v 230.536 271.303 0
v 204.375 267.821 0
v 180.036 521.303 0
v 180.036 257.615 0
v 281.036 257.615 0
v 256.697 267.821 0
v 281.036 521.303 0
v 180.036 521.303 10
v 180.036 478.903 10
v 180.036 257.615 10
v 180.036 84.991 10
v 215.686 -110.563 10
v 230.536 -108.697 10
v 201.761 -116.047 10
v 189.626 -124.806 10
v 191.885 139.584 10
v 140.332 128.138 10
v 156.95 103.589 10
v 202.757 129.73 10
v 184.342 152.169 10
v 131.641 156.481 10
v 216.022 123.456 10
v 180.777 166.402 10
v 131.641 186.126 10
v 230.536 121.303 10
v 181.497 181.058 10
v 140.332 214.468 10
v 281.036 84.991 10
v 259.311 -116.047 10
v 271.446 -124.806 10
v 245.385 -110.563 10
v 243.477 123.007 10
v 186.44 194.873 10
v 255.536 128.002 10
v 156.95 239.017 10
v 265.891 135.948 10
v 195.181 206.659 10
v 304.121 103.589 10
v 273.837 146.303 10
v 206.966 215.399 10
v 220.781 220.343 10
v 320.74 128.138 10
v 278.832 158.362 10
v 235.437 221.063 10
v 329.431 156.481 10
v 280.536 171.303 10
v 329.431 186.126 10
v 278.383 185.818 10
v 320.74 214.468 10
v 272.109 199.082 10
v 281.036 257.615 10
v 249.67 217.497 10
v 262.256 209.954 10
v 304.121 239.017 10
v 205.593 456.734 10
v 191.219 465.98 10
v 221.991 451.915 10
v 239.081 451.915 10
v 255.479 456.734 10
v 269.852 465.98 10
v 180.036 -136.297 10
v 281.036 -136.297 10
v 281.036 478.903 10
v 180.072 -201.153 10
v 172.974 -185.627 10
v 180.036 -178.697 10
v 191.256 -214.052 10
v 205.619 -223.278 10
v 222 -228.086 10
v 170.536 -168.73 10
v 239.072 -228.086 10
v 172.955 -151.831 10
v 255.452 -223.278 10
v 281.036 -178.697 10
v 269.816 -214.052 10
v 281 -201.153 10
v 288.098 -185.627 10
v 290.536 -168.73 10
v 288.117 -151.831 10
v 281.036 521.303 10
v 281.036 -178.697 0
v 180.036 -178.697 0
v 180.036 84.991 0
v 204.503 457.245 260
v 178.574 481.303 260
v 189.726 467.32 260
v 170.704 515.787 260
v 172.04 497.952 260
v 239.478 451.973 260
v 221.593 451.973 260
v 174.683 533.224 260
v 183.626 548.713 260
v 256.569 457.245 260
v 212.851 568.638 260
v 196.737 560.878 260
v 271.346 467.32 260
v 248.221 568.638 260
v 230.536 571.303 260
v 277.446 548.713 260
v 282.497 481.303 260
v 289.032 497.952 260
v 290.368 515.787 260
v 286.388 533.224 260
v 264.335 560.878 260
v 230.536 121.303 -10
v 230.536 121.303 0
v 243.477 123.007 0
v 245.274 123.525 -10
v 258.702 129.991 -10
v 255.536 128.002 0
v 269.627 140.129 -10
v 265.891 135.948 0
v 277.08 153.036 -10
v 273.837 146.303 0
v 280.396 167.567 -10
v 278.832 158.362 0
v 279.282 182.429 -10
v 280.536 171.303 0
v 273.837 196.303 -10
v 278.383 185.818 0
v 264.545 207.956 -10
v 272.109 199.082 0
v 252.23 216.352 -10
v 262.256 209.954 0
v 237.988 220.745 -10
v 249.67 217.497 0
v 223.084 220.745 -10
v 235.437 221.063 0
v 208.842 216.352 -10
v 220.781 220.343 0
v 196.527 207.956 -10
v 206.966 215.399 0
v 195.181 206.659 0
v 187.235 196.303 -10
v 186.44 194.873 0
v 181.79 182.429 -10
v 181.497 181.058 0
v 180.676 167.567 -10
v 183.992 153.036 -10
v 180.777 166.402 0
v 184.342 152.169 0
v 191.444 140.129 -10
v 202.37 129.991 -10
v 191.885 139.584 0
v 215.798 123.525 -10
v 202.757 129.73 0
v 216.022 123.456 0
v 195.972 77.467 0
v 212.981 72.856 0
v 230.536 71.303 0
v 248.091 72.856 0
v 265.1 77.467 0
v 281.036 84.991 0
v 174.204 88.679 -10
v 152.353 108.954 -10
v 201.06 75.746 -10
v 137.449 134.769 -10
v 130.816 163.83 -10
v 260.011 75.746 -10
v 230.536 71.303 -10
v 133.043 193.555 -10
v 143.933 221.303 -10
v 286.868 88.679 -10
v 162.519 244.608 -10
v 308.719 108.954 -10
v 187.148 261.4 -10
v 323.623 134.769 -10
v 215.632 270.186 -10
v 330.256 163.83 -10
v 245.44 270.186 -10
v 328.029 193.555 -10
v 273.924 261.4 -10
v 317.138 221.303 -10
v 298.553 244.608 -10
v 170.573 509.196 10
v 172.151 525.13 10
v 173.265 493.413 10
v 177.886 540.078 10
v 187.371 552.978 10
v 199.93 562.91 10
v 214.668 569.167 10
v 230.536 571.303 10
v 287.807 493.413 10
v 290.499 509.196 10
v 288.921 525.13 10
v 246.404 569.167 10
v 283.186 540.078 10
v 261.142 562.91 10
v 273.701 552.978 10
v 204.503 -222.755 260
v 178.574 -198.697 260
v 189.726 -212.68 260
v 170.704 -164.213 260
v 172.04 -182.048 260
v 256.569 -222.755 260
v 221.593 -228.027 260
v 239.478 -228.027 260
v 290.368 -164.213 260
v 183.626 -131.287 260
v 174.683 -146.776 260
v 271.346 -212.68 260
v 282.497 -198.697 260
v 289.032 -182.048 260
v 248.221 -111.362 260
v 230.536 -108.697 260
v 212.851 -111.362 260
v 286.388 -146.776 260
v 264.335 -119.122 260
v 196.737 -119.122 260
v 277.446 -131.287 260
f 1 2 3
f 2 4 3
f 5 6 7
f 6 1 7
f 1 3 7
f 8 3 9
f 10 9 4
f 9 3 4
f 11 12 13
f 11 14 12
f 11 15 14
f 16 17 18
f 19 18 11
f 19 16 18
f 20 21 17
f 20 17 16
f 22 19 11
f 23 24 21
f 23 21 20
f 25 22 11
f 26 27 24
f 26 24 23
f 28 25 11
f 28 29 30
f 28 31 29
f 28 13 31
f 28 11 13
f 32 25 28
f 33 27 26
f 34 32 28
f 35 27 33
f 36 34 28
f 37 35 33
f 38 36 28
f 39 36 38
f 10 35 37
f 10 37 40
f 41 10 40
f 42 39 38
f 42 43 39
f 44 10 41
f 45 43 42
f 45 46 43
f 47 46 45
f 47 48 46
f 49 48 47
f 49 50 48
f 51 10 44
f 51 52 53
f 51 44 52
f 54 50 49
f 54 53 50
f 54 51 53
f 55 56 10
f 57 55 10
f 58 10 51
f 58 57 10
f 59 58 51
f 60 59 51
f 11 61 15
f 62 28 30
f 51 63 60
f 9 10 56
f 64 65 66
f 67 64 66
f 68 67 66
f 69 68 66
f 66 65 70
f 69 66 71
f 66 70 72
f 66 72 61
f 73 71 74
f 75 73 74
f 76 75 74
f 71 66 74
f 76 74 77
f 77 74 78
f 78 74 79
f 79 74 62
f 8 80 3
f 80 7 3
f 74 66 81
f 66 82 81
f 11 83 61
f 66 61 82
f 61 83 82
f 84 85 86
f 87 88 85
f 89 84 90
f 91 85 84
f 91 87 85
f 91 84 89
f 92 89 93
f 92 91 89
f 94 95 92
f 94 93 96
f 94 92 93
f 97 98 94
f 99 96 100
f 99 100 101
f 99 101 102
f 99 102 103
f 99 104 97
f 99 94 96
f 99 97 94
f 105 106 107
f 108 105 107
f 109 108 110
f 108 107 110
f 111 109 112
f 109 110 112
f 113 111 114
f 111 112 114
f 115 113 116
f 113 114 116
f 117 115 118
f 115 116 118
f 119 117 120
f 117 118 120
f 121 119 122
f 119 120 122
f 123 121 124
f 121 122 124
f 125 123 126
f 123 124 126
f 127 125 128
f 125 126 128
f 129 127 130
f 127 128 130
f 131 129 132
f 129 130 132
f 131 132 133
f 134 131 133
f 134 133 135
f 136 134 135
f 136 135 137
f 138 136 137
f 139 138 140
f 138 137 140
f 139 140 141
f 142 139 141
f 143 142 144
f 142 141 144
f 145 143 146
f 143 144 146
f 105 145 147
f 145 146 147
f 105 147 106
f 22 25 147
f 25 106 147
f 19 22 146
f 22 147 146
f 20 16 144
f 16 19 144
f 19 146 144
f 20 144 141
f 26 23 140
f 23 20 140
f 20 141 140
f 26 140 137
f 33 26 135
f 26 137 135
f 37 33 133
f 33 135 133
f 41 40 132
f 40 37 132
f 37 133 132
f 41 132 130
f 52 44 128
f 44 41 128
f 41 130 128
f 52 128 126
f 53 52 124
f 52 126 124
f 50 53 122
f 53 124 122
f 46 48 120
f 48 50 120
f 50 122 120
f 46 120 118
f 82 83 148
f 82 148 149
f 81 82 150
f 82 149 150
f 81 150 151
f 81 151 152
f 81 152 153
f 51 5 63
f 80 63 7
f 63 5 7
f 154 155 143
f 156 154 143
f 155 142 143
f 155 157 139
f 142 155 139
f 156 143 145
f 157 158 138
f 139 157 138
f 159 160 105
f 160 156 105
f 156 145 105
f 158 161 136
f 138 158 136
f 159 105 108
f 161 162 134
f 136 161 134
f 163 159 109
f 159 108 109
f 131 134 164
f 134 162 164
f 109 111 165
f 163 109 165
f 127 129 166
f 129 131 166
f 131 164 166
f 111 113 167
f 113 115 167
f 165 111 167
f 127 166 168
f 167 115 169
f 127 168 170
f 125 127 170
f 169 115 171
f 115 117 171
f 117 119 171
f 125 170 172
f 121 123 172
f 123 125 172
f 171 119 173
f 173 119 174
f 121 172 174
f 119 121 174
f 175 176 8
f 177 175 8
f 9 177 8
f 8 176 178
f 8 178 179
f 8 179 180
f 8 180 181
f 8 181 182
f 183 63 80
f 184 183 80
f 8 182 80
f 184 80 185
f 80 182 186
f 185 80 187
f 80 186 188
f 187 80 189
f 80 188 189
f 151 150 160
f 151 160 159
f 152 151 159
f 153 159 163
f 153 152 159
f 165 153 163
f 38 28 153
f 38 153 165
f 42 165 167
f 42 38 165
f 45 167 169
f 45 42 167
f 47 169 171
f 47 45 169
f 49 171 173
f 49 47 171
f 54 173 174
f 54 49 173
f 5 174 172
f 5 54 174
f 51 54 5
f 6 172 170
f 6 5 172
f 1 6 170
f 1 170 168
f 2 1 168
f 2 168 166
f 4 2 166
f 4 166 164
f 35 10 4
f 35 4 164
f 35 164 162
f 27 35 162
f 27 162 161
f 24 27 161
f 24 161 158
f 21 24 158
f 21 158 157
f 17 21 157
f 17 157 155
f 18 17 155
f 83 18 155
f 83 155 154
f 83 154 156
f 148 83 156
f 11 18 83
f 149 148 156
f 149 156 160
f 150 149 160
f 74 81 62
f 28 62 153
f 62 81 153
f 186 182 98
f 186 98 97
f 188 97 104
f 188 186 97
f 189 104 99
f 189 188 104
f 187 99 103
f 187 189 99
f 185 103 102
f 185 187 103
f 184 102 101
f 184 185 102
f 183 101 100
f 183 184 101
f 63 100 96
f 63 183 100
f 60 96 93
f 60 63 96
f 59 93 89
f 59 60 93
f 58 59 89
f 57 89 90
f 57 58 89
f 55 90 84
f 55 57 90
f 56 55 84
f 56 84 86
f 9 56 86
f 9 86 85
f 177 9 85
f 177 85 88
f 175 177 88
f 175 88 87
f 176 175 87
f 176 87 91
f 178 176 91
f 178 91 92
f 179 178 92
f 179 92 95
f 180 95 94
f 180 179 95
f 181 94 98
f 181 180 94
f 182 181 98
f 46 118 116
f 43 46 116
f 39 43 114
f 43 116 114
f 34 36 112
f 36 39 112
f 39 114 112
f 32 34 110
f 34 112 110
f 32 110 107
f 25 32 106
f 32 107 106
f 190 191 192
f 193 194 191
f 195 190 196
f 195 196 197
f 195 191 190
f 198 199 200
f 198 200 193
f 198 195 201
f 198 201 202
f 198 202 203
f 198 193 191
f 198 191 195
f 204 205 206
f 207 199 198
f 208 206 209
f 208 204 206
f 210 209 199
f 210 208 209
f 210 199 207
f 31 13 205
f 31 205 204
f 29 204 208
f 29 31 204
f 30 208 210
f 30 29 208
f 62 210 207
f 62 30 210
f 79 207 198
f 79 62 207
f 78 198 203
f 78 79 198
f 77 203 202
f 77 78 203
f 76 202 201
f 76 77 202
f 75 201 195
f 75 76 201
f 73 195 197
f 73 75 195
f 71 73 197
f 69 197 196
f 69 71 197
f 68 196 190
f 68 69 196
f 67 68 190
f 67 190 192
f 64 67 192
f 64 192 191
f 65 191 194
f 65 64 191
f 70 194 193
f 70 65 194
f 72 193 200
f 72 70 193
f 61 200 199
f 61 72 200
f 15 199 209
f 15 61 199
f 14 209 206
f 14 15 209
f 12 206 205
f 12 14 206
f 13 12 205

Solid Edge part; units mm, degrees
sketch "Sketch1" plane through (0, 0, 0) normal (0, 0, 1) x (1, 0, 0)
  circle A0 centre (230.5359, 171.3033) radius 50
  line L0 (180.0359, -178.6967) -> (281.0359, -178.6967)
  line L1 (281.0359, -178.6967) -> (281.0359, 521.3033)
  line L2 (281.0359, 521.3033) -> (180.0359, 521.3033)
  line L3 (180.0359, 521.3033) -> (180.0359, -178.6967)
  dimension "D1" = 700
  dimension "D2" = 101
  dimension "D3" = 100
extrude "Protrusion1" add sketch "Sketch1" along normal blind 10
sketch "Sketch2" plane through (-51.1743, -74.6061, 10) normal (0, 0, 1) x (0, 1, 0)
  circle A0 centre (585.9094, -281.7102) radius 60
  circle A1 centre (-94.0906, -281.7102) radius 60
  dimension "D1" = 10
  dimension "D2" = 10
extrude "ExtrudedProtrusion_3" add sketch "Sketch2" along normal blind 250
sketch "Sketch3" plane through (220.0359, 121.3033, 10) normal (0, 0, 1) x (0, -1, 0)
  circle A0 centre (-50, 10.5) radius 50
  circle A1 centre (-50, 10.5) radius 100
  dimension "D1" = 200
  dimension "D2" = 100
extrude "ExtrudedProtrusion_4" add sketch "Sketch3" against normal blind 20
